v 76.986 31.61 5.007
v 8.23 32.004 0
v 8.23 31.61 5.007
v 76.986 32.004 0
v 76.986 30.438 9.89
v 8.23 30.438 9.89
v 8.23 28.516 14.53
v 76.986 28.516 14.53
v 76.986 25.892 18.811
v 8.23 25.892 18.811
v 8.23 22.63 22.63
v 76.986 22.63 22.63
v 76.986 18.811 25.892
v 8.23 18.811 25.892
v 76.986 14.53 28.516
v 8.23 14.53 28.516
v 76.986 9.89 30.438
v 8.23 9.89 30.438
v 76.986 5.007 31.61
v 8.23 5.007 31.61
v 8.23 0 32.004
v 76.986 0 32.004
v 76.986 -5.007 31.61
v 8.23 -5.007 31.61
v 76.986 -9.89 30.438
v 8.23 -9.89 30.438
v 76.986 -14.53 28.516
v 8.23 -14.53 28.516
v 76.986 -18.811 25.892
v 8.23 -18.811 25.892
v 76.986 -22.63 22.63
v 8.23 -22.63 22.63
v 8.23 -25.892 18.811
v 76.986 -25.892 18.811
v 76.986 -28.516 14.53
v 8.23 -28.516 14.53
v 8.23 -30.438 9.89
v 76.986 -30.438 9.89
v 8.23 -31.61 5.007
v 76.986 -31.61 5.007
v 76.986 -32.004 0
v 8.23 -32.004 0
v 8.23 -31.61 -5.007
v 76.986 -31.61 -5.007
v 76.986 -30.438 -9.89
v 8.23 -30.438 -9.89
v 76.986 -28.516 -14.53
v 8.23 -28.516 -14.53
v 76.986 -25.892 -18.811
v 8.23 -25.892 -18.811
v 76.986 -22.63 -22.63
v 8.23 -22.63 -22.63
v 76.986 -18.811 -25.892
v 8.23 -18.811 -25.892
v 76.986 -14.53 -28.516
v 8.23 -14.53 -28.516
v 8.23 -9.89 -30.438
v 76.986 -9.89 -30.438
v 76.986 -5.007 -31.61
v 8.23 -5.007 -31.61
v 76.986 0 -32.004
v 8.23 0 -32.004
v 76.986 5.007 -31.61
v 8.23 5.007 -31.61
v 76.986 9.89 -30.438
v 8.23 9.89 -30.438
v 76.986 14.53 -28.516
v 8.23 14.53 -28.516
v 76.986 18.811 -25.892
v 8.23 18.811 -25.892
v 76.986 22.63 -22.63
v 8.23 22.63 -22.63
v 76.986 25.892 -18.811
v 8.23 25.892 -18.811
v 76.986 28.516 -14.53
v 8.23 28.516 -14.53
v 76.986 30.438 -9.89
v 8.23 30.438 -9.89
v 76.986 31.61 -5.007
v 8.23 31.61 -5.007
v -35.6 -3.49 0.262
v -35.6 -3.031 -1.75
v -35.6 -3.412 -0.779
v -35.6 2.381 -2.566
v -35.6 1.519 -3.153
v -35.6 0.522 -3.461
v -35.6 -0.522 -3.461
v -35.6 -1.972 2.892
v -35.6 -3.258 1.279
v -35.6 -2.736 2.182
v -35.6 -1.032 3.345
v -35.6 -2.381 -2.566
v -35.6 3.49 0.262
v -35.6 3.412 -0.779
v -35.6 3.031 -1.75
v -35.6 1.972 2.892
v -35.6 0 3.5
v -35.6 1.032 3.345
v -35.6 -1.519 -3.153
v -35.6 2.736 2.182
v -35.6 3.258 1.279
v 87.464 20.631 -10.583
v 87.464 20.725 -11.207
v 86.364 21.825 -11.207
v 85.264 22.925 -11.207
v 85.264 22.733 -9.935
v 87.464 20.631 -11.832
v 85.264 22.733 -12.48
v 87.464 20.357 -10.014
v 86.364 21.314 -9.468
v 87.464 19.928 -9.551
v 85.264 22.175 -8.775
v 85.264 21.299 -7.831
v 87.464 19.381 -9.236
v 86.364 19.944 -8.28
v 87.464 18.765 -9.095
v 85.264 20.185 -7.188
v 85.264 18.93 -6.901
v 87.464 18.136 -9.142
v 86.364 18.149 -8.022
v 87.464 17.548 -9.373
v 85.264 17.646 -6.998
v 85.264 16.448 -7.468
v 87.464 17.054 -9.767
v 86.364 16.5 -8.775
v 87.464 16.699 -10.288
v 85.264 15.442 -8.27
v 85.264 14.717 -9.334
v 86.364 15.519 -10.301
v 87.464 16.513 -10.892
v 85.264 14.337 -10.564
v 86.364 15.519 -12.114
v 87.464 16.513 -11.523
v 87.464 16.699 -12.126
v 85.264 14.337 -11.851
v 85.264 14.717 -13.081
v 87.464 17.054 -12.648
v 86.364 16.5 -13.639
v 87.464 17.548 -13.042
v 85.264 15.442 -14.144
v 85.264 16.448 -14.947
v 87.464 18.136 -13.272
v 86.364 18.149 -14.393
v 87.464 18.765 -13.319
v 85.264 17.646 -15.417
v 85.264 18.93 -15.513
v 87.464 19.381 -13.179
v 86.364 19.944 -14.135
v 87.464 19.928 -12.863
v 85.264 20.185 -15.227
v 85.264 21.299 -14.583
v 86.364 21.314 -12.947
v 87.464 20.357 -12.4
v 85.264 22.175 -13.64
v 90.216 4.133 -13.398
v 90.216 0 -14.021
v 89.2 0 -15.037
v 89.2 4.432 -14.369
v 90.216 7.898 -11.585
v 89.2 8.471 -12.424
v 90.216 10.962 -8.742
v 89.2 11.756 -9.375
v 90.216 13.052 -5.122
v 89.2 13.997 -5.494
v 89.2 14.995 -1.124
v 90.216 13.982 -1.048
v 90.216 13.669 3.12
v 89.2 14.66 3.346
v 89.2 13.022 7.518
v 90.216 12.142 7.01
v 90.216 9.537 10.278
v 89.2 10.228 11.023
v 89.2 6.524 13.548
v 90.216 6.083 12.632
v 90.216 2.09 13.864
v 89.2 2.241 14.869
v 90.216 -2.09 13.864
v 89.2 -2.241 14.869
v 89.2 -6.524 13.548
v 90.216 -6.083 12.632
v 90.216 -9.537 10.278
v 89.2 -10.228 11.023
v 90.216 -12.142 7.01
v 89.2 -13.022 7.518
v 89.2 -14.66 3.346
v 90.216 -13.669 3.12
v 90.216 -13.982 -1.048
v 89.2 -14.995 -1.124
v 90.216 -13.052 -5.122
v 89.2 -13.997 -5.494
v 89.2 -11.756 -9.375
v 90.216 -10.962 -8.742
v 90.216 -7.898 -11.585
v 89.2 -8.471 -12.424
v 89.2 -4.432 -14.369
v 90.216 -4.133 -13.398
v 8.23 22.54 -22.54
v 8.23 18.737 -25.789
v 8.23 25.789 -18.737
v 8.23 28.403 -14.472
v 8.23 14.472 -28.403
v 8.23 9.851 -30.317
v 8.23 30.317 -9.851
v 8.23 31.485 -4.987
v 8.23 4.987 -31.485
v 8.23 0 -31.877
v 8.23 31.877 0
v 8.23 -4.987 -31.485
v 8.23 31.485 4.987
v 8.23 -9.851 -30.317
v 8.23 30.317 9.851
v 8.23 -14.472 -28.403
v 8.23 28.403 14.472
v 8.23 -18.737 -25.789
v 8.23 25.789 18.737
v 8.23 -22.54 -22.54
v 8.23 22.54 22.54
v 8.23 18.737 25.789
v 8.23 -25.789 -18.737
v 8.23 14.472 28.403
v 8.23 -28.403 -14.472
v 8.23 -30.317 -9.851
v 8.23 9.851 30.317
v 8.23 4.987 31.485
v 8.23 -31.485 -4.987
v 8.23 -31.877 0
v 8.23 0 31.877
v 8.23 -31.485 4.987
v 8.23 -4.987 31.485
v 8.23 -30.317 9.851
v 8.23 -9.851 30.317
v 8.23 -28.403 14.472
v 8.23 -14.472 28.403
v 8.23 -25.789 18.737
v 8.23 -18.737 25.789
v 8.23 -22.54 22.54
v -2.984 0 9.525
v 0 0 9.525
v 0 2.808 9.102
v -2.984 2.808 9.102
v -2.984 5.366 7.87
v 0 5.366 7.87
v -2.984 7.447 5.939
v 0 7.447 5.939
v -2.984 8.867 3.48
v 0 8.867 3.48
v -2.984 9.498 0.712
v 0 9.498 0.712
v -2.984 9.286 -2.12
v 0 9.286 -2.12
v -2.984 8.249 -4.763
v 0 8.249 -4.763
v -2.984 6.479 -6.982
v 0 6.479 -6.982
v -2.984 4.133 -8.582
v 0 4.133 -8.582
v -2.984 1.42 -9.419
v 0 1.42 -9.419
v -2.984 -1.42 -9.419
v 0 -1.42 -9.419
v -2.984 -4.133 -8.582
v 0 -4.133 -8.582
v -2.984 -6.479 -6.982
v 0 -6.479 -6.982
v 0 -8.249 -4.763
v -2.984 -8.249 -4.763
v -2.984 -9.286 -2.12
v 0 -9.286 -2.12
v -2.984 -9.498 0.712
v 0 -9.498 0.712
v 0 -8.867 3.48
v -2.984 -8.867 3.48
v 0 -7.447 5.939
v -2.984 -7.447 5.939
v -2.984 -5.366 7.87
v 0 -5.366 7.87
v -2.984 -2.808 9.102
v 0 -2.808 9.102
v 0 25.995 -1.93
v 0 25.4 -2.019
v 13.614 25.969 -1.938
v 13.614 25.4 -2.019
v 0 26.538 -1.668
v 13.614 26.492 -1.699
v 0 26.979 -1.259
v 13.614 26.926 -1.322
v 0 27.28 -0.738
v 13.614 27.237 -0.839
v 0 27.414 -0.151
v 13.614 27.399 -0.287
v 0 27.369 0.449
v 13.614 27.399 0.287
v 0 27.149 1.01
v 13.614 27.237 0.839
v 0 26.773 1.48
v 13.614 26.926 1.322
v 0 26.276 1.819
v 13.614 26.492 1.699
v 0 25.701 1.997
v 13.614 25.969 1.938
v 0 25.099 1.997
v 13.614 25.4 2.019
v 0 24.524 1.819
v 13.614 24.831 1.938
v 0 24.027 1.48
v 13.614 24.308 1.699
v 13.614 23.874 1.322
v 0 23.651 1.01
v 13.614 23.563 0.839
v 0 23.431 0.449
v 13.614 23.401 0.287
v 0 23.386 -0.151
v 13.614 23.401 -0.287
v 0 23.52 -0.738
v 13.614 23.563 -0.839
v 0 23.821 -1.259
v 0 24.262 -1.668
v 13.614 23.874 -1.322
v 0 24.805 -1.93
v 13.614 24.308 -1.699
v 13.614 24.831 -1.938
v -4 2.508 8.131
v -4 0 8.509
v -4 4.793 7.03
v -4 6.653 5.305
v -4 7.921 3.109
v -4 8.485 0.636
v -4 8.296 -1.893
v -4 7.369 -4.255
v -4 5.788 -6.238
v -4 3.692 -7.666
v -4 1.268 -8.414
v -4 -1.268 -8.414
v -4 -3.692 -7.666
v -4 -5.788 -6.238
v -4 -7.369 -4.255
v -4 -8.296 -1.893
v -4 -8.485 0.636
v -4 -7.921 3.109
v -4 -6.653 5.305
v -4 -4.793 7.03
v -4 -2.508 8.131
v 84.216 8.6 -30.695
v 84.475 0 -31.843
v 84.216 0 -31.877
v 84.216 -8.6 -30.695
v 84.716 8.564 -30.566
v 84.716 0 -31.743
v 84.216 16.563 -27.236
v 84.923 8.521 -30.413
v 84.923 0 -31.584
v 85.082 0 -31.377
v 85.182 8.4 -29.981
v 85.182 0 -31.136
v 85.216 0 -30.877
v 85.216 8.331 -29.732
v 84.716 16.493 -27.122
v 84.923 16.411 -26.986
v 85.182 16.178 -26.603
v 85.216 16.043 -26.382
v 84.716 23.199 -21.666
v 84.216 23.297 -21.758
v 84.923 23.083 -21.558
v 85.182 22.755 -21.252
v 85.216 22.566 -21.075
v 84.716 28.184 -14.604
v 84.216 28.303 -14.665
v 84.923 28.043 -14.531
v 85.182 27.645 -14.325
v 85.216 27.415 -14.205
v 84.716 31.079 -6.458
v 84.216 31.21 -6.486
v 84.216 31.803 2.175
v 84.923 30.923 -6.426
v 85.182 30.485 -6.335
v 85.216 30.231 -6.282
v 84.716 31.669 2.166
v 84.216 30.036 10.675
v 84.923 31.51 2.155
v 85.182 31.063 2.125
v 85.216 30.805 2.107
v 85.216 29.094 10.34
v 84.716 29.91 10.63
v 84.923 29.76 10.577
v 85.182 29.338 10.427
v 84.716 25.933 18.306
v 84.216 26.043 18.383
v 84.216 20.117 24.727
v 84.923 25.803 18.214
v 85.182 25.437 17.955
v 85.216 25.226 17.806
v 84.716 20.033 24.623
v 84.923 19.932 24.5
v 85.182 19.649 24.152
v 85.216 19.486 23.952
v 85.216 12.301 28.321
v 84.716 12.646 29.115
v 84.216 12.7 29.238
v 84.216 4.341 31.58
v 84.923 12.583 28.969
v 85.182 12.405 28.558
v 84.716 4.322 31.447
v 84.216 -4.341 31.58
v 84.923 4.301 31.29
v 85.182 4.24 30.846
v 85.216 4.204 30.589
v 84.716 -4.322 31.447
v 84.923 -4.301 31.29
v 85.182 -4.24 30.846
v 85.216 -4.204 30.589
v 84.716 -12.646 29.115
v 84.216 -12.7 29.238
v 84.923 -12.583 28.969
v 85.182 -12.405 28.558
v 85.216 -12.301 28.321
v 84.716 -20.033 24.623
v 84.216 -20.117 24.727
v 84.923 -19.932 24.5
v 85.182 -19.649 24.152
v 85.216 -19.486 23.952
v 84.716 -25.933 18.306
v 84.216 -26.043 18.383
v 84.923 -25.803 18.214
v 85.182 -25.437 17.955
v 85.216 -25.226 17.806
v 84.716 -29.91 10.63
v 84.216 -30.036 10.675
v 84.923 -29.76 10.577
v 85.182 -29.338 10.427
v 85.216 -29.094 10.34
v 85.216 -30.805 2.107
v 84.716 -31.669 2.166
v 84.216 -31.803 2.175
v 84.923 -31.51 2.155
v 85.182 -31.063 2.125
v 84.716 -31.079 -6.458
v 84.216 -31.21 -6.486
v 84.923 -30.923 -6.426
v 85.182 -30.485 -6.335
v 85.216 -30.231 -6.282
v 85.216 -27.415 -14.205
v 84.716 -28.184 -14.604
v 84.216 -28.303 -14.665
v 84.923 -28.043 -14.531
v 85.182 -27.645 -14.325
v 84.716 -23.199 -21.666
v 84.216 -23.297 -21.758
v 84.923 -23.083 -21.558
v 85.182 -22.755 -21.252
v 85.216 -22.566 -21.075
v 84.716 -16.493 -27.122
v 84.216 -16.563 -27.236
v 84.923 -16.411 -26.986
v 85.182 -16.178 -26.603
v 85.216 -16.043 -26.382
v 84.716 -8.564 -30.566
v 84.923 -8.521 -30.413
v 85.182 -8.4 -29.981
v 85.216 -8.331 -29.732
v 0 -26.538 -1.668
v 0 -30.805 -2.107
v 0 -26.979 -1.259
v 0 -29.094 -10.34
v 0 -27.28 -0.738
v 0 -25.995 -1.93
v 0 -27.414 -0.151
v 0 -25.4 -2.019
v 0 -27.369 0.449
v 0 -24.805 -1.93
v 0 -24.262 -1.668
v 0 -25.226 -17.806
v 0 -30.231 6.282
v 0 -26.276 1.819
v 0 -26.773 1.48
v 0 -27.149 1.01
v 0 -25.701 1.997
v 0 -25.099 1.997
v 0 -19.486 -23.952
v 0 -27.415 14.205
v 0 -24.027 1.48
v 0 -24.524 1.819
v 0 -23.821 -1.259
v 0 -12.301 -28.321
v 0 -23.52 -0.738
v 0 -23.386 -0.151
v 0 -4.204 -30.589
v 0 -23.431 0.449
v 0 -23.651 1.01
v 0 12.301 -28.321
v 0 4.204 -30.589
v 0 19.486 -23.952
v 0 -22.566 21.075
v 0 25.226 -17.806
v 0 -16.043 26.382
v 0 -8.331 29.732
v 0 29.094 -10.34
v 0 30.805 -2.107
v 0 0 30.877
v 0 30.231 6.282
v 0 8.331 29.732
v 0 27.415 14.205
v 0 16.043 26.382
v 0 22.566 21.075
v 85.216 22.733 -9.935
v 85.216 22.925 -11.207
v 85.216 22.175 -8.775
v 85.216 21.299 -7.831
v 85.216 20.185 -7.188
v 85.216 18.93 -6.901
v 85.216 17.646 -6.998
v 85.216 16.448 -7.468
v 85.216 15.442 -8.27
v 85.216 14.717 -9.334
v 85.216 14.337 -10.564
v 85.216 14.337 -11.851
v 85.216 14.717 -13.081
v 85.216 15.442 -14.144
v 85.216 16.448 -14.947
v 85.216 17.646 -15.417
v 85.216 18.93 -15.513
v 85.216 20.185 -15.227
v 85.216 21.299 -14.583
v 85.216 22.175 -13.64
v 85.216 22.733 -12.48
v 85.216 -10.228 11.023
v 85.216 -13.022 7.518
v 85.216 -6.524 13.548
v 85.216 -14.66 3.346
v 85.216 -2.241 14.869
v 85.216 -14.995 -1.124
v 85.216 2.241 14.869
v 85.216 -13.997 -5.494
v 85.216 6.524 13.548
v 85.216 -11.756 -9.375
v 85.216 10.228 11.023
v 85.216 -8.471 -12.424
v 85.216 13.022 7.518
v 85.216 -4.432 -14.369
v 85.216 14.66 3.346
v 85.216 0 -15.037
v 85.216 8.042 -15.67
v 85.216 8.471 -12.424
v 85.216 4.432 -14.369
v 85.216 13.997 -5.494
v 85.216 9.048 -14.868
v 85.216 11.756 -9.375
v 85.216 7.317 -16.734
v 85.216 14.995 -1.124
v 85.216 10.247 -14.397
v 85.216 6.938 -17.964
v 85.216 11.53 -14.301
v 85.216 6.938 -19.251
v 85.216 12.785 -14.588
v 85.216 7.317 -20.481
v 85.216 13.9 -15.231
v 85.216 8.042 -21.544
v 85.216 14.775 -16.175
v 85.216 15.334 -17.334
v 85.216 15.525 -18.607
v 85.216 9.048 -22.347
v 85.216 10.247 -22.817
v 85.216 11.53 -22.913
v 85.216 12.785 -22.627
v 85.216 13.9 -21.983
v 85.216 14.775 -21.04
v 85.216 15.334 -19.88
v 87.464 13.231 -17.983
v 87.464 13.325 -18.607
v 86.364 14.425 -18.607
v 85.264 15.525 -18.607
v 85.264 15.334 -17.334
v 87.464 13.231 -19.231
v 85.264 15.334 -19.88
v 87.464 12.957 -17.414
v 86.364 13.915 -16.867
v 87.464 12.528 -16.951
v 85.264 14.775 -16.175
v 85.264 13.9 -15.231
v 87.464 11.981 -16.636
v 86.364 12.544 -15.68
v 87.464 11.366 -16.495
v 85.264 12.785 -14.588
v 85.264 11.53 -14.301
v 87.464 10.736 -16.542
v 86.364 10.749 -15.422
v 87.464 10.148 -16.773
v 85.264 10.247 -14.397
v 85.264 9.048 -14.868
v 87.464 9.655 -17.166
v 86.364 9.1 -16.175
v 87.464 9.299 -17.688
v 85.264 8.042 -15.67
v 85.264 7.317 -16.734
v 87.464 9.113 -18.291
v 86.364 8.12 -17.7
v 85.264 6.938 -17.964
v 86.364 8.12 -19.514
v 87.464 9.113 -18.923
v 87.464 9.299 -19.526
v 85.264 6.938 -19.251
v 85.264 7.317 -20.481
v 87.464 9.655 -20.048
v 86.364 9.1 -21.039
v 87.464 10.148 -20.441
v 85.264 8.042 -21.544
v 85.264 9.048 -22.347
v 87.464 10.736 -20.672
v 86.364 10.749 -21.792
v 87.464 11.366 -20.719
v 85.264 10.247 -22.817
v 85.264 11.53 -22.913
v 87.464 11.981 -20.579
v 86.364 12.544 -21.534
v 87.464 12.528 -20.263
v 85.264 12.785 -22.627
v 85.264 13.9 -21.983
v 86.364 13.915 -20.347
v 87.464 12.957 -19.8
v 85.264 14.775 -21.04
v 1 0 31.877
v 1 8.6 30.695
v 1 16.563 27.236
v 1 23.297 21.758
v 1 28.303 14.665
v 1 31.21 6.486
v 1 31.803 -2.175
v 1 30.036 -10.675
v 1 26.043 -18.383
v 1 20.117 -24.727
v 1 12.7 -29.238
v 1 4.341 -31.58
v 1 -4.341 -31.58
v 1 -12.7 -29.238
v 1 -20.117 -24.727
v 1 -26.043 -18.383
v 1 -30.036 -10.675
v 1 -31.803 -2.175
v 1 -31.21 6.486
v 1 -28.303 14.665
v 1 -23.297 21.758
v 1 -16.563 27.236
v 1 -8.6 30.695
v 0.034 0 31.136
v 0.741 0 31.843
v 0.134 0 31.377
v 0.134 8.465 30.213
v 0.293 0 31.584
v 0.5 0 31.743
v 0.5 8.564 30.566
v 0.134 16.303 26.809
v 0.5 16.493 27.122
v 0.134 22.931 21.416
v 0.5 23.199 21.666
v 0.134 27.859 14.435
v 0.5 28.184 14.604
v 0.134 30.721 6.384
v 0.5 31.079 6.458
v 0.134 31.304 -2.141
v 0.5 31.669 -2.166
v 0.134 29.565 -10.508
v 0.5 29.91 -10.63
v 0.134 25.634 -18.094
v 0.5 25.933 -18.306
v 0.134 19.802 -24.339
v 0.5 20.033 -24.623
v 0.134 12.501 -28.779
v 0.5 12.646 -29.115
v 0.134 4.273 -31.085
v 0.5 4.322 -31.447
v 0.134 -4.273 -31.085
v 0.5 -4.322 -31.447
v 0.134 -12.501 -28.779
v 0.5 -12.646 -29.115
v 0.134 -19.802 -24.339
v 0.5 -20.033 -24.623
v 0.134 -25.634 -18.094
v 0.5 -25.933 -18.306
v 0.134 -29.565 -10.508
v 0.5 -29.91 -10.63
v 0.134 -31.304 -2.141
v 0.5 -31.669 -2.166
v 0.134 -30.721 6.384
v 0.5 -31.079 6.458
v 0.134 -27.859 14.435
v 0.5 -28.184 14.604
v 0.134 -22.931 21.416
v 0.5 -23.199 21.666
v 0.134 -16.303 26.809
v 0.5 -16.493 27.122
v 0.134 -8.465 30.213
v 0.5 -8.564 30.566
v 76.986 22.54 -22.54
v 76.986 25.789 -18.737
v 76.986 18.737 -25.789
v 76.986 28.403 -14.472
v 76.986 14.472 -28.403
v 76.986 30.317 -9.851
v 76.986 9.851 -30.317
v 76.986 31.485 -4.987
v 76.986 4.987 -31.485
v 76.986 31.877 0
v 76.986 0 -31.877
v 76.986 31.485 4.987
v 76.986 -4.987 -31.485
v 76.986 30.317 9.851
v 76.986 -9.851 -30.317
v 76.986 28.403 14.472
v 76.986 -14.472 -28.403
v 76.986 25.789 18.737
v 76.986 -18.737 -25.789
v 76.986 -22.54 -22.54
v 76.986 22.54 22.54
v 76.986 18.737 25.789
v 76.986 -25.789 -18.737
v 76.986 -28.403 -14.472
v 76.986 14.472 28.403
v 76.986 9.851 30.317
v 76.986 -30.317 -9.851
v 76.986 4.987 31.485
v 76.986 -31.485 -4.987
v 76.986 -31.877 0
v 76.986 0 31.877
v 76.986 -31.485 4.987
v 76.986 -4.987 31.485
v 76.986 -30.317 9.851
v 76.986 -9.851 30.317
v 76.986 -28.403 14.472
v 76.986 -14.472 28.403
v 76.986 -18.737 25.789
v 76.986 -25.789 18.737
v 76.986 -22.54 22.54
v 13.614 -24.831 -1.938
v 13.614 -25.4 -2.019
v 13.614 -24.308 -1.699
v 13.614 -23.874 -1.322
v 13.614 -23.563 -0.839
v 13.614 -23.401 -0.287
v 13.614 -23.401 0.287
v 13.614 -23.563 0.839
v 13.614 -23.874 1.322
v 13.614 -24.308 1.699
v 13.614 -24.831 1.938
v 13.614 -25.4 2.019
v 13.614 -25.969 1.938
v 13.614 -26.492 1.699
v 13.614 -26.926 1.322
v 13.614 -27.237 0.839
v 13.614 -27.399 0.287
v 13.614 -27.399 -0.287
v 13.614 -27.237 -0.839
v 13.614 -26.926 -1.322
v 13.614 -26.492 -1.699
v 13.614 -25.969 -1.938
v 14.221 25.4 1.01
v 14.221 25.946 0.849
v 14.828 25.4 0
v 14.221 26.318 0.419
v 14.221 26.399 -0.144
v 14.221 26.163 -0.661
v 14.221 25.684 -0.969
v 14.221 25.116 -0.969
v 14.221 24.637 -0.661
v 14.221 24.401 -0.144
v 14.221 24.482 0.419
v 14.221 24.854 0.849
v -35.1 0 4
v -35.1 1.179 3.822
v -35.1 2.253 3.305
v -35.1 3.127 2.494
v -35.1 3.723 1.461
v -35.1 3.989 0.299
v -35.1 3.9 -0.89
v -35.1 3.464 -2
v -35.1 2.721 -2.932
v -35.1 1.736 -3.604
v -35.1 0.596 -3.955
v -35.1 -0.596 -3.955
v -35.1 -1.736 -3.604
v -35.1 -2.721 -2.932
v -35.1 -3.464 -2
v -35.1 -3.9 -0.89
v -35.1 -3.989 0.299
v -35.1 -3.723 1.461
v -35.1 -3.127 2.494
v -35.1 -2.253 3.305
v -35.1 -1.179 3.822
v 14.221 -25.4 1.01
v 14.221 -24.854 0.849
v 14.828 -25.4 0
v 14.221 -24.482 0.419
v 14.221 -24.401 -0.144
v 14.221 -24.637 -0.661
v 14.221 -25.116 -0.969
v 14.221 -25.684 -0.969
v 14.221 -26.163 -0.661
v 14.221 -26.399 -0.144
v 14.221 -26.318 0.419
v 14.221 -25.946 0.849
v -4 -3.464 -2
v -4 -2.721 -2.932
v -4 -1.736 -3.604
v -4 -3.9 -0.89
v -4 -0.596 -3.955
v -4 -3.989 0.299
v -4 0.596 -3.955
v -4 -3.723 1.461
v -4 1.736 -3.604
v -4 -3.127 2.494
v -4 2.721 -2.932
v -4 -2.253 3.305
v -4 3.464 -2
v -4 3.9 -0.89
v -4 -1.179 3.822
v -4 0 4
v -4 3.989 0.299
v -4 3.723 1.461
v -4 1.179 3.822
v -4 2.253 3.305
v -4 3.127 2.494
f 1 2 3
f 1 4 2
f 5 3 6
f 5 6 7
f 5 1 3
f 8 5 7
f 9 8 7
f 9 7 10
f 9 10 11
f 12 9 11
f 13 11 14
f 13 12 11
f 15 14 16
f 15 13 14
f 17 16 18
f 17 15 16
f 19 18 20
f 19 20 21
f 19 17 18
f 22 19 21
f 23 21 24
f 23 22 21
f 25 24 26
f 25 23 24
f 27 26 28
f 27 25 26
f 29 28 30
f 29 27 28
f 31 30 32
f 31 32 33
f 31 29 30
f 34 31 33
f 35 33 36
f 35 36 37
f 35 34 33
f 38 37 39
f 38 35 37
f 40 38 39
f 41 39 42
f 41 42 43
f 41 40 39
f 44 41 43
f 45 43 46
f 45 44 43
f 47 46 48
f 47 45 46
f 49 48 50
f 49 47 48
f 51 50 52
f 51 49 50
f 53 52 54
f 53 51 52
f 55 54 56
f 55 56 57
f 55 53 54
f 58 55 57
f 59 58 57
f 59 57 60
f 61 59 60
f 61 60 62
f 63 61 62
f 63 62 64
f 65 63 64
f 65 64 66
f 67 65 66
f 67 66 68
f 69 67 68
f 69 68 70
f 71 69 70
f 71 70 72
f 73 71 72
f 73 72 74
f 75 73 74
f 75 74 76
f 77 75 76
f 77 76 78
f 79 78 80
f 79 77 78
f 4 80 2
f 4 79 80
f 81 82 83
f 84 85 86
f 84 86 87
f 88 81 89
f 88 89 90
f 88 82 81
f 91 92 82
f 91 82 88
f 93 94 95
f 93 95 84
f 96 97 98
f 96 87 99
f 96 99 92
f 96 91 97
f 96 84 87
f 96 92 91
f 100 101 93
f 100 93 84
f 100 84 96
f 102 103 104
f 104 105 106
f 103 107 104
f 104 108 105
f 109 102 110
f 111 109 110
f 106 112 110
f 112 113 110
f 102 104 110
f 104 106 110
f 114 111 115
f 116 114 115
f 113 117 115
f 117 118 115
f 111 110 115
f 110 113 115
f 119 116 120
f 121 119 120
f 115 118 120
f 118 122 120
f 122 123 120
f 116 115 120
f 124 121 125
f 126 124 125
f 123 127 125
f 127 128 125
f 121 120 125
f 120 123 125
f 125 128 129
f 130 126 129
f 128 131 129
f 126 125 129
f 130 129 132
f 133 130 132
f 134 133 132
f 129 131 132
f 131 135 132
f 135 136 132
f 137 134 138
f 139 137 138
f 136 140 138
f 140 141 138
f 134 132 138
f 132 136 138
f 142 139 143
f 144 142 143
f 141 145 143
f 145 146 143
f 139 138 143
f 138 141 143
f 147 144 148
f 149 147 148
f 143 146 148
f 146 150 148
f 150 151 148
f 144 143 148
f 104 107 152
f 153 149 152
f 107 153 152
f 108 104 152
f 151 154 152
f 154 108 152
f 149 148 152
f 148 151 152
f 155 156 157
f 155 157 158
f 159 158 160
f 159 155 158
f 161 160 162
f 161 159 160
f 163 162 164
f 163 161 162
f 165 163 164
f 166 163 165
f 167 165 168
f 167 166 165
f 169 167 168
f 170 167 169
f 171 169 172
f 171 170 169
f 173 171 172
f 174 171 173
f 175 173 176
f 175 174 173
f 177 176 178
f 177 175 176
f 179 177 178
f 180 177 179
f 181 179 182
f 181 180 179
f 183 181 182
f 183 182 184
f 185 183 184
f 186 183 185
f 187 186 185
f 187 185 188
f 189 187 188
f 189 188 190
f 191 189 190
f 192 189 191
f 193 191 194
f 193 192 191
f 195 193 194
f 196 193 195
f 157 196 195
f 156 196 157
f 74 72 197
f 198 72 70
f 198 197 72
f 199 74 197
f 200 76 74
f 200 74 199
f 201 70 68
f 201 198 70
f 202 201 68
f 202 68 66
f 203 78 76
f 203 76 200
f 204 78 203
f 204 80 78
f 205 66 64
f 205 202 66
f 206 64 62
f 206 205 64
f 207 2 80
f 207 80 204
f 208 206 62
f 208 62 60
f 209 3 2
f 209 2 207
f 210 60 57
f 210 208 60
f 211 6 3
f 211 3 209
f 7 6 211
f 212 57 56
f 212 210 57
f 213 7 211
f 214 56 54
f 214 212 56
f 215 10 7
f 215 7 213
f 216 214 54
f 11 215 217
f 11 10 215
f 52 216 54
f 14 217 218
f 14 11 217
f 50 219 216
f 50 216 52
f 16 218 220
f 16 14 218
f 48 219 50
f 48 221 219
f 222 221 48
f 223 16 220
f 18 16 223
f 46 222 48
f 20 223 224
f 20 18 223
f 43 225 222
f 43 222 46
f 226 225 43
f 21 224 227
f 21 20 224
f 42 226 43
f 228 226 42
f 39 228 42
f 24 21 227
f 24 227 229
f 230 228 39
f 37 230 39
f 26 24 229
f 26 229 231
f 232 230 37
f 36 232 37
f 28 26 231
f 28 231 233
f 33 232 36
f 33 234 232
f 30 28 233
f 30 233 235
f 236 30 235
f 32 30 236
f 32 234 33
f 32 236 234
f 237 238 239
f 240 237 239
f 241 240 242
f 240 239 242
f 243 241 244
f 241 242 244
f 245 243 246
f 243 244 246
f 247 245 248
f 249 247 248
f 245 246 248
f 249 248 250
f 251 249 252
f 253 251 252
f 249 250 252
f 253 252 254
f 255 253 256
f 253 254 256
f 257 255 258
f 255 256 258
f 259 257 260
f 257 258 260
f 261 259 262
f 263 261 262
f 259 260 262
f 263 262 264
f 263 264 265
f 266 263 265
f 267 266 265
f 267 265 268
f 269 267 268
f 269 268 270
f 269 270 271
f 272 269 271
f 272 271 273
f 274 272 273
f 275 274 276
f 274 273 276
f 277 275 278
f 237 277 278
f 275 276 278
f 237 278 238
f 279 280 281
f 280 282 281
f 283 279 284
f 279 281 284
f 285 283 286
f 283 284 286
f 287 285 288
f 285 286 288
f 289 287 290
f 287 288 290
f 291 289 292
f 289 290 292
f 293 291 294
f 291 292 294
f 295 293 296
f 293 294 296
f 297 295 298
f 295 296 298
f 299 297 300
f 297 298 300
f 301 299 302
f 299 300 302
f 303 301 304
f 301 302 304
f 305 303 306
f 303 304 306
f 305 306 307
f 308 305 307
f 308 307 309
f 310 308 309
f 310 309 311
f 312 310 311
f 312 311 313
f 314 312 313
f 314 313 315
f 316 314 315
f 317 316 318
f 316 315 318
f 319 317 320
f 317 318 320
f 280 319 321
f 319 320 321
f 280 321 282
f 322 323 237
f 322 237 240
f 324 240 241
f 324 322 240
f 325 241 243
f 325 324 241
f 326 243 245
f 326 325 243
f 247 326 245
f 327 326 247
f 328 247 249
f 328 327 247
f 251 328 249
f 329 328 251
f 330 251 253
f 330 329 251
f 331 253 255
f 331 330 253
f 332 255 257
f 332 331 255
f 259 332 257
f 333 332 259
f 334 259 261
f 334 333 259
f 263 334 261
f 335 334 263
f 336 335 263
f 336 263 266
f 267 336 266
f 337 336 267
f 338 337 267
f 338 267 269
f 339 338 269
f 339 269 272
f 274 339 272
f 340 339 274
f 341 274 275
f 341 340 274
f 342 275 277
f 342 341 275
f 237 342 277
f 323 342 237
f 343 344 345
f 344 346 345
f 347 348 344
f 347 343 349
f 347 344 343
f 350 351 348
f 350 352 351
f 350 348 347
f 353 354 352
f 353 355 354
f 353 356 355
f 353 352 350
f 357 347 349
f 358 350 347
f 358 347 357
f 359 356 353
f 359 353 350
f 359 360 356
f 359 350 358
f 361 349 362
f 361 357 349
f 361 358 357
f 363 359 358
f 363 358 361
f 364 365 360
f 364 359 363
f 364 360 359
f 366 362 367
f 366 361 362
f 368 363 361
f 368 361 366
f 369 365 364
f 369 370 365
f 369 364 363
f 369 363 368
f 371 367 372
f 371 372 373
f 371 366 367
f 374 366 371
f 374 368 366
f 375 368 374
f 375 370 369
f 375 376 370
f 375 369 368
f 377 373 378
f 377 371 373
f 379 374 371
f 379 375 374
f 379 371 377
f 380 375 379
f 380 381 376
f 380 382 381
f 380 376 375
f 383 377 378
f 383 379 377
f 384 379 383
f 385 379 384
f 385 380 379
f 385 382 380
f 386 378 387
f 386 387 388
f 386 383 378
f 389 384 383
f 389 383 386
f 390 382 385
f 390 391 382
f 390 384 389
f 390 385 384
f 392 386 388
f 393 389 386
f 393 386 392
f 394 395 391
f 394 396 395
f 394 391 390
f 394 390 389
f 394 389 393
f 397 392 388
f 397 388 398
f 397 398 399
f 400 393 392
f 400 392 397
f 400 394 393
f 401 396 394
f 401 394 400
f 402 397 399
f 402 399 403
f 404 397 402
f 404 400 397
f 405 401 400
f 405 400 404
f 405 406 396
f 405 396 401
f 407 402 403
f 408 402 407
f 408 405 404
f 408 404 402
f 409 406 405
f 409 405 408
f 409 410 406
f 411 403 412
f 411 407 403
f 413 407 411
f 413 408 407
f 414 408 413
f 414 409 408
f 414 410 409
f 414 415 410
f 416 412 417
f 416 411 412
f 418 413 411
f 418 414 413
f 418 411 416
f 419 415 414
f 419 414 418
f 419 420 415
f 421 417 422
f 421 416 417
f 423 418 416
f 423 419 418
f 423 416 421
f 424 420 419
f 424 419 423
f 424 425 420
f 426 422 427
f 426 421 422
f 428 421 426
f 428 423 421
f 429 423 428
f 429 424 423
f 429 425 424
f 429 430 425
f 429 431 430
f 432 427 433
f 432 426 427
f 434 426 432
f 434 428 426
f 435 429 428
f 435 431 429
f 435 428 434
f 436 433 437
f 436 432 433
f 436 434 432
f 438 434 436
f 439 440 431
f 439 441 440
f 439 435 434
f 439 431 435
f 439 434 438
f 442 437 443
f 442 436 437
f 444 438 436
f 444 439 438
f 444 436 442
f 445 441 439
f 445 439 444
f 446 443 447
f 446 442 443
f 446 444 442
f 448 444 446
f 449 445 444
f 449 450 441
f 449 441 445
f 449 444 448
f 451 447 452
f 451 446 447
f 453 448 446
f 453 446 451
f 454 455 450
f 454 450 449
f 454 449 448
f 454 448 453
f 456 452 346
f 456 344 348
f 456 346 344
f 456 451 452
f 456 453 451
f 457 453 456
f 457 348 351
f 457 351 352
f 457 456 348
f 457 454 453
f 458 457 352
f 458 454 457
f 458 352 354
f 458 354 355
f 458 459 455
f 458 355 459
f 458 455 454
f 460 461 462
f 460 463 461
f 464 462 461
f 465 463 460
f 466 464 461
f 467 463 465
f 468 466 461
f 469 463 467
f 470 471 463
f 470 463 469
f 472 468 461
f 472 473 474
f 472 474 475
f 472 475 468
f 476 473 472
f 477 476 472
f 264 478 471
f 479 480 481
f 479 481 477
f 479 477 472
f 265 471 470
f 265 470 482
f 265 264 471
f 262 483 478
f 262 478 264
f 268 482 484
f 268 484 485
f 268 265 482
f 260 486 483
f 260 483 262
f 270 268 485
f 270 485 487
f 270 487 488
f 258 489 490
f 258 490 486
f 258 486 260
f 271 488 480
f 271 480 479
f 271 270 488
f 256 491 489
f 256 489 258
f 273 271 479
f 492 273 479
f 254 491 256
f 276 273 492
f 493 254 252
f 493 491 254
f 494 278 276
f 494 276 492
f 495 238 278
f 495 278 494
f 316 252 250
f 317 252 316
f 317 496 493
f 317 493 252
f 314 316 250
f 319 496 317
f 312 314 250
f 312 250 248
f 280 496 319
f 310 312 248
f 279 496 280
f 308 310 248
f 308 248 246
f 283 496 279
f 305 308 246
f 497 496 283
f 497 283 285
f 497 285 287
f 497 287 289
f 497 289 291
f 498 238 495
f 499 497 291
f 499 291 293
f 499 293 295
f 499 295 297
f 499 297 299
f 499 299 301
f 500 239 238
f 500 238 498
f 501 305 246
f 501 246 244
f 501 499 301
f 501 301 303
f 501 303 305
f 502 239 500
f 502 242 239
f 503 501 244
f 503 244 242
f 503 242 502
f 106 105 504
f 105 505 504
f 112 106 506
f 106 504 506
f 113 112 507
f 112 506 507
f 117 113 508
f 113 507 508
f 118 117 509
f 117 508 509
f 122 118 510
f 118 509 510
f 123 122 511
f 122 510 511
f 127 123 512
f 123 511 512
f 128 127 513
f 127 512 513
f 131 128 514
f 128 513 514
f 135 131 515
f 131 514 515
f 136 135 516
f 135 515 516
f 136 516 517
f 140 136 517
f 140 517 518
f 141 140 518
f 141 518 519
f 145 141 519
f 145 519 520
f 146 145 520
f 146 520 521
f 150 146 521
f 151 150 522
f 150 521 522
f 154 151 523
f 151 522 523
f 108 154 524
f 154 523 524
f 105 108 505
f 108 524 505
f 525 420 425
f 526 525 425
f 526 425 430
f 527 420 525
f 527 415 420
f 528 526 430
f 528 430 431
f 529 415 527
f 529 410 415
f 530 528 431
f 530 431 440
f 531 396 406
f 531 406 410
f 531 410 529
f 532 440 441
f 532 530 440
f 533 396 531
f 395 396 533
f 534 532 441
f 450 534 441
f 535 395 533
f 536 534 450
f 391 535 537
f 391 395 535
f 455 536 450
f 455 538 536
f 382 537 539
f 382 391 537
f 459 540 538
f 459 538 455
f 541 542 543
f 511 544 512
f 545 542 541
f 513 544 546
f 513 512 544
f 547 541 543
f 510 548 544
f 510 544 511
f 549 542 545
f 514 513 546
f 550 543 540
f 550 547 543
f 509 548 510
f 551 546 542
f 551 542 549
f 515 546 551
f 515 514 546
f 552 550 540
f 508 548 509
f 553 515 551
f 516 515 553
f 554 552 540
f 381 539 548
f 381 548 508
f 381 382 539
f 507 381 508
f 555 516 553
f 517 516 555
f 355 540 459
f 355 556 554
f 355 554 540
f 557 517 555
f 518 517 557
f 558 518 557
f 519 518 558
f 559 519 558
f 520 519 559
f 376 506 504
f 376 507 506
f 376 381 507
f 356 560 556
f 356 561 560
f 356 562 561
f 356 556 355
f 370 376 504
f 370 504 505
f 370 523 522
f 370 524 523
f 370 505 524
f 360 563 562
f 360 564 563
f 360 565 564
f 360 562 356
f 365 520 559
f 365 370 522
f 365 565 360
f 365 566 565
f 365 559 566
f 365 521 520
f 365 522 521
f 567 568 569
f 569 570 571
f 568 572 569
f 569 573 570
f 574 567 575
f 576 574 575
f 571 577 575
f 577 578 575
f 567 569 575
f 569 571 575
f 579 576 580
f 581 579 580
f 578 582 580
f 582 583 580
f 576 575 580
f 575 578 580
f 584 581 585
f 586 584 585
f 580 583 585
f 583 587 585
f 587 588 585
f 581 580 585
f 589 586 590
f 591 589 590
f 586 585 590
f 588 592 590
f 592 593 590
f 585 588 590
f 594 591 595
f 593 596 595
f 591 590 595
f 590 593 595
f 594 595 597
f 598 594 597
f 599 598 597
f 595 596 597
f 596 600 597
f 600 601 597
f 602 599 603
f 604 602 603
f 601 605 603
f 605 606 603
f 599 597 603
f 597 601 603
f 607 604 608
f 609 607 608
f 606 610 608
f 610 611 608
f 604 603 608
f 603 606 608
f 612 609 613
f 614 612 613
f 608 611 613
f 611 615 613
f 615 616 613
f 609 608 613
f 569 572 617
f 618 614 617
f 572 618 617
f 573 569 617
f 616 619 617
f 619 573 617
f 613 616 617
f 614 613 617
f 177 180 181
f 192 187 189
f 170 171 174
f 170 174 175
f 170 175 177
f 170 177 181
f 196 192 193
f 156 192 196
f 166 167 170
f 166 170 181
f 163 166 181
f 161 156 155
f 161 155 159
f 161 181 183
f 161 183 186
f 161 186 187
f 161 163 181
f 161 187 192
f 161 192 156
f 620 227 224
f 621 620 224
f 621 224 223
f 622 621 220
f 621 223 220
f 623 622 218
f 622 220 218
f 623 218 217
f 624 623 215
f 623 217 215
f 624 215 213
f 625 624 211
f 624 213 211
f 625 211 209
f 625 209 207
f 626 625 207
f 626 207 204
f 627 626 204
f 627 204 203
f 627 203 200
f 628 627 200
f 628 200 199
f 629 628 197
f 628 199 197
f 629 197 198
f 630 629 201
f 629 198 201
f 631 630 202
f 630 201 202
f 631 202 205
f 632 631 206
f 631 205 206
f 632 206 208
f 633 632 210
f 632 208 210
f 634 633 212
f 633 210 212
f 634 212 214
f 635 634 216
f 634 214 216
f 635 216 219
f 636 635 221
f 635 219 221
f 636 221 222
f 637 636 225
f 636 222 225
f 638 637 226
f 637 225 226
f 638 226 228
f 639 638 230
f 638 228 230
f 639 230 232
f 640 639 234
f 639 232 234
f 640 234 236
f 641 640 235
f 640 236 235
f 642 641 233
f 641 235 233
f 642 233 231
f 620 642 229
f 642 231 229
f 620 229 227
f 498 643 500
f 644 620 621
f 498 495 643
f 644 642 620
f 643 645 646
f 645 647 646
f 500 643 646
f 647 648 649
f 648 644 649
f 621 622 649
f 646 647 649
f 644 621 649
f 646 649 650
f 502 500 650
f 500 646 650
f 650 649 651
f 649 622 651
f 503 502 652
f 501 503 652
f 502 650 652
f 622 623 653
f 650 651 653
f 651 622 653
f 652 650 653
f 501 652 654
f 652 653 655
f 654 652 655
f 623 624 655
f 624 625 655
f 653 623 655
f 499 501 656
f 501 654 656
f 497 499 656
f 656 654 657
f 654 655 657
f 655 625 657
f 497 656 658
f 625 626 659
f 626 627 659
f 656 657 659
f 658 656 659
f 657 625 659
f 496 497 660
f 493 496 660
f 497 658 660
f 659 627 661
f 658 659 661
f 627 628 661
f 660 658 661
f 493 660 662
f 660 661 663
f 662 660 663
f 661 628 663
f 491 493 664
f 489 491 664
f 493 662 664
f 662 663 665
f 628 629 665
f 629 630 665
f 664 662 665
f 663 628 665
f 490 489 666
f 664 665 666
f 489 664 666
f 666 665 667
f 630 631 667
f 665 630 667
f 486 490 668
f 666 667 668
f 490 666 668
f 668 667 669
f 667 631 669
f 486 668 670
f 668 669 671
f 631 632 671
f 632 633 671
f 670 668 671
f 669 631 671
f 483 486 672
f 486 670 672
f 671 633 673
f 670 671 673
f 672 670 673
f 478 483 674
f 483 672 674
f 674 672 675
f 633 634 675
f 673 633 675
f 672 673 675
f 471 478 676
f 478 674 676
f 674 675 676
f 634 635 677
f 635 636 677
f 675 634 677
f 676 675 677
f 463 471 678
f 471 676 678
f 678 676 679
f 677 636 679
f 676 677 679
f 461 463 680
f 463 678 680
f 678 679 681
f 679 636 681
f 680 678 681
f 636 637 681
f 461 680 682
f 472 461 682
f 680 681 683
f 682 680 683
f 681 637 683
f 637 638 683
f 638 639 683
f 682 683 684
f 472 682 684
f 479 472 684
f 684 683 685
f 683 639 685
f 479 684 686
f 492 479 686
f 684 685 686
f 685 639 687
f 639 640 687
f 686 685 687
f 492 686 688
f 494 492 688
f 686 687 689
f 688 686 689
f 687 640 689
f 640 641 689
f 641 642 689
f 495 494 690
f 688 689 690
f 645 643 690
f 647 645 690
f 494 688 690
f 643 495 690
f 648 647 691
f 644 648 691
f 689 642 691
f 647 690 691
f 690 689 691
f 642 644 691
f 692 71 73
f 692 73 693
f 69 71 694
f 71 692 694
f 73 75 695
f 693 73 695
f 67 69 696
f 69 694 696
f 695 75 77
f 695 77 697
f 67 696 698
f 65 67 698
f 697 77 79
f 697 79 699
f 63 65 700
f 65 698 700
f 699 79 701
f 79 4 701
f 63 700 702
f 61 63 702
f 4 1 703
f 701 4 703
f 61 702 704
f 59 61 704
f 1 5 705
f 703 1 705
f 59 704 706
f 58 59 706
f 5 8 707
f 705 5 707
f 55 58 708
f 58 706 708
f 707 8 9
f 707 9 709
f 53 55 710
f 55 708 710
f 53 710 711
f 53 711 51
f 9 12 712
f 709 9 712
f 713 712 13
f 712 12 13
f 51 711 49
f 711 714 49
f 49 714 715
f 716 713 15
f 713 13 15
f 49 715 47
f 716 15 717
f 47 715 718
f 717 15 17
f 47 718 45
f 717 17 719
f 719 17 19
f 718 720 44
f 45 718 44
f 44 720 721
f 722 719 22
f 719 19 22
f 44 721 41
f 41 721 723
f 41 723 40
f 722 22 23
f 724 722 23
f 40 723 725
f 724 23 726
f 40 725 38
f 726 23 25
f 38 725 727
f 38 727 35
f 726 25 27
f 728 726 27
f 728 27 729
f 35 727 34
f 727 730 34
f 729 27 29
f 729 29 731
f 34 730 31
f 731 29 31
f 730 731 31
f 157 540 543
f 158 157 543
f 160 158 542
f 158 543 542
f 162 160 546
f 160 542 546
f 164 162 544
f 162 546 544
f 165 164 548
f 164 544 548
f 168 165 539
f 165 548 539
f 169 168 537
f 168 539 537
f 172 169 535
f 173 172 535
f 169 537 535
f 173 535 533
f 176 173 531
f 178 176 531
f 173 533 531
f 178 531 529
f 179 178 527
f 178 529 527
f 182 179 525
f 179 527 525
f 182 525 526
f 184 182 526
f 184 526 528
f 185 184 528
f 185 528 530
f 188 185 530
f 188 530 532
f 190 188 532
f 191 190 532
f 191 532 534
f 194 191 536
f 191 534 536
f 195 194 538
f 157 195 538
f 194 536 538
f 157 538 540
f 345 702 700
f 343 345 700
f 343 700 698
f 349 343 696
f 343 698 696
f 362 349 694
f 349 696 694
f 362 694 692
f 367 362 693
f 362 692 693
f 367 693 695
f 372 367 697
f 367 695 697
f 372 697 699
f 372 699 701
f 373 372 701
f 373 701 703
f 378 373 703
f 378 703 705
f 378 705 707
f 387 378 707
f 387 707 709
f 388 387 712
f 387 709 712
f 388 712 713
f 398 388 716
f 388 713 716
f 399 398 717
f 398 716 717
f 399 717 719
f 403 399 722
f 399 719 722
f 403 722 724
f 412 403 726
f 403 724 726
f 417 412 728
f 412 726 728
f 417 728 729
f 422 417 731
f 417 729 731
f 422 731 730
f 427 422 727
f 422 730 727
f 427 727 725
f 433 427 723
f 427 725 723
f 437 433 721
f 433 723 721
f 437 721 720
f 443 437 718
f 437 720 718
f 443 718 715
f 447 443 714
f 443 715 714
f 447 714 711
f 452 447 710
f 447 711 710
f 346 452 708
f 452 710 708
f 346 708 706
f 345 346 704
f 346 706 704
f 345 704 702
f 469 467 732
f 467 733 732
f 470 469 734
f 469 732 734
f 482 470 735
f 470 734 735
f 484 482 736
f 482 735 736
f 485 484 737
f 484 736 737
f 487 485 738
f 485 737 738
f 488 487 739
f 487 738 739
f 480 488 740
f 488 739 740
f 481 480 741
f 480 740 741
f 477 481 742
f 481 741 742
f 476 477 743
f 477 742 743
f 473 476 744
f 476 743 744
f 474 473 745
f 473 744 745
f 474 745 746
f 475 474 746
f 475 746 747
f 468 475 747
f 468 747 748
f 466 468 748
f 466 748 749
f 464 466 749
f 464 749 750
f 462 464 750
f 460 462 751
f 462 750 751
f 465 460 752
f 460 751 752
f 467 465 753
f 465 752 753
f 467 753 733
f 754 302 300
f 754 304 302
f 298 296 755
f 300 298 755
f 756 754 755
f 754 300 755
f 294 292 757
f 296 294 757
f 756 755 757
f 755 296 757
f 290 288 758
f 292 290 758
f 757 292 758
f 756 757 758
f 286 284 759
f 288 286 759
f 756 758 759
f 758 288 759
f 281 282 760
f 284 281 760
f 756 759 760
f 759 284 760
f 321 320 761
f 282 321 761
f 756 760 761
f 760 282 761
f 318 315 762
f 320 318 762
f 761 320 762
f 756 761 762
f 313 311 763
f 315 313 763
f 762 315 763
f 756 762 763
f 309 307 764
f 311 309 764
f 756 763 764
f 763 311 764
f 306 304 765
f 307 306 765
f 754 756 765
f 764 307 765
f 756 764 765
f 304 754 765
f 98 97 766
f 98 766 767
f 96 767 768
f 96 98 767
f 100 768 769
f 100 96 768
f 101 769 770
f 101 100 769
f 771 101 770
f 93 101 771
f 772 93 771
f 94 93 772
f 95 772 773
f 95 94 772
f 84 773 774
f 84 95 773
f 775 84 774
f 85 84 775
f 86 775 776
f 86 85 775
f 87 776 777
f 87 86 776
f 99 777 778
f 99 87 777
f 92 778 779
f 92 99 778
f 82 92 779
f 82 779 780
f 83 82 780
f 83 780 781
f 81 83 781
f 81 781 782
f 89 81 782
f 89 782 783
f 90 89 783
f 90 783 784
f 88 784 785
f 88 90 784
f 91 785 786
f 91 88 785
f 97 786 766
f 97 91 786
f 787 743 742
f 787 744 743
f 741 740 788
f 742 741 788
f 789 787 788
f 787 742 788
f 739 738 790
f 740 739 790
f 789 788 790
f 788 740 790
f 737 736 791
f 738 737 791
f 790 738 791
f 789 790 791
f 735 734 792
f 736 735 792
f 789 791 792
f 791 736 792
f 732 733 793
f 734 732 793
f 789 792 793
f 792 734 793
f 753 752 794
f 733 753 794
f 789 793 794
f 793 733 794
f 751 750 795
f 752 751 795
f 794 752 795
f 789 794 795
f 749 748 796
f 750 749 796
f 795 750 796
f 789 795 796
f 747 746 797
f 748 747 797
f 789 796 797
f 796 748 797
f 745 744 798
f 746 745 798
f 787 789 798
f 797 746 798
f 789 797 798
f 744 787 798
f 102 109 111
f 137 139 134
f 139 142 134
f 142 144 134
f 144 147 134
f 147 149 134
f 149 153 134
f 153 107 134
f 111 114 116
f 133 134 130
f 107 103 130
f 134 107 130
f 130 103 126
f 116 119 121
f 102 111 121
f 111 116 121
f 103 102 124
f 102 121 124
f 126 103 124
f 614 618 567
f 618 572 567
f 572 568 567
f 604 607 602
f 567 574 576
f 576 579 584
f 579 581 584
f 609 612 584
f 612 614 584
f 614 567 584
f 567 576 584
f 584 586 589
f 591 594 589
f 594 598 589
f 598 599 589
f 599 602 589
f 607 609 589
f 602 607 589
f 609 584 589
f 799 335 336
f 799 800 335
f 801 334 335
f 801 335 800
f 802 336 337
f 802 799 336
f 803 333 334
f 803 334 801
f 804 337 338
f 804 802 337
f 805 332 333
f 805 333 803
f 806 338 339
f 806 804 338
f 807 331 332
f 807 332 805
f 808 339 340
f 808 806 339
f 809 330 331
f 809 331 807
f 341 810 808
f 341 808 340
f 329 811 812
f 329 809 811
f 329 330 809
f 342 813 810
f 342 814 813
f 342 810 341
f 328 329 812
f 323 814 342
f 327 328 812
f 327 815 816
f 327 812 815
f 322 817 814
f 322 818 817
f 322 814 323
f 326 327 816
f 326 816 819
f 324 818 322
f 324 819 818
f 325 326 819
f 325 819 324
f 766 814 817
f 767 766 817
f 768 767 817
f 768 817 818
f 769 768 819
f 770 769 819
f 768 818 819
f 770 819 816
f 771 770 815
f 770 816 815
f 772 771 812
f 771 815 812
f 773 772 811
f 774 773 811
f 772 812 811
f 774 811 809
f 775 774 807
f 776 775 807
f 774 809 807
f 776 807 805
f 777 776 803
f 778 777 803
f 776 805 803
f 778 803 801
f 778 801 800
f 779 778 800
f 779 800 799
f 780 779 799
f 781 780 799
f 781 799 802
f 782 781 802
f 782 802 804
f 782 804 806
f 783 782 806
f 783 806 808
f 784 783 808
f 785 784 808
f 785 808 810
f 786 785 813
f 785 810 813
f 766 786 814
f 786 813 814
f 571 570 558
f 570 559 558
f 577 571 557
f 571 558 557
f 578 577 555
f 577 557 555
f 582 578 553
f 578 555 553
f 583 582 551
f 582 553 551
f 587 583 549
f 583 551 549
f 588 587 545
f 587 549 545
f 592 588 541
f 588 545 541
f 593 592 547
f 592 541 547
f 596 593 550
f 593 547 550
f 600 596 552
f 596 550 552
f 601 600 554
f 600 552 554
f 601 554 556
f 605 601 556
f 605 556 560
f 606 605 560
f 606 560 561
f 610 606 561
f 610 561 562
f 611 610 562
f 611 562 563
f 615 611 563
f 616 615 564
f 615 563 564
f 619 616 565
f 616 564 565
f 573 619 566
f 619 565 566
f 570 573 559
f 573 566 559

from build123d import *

# Parameters (mm, degrees)
SKETCH1_W                       = 68.7568
SKETCH1_H                       = 32.004
SKETCH2_R                       = 31.877
BOSS_EXTRUDE1_DEPTH             = 8.2296
SKETCH3_R                       = 15.0368
BOSS_EXTRUDE2_DEPTH             = 5
SKETCH4_R                       = 31.877
BOSS_EXTRUDE3_DEPTH             = 8.2296
SKETCH5_R                       = 9.525
BOSS_EXTRUDE4_DEPTH             = 4
SKETCH6_R                       = 4
BOSS_EXTRUDE5_DEPTH             = 31.6
F_21_0_159_DIAMETER_HOLE1_D     = 4.0386
F_21_0_159_DIAMETER_HOLE1_DEPTH = 13.6144
F_21_0_159_DIAMETER_HOLE1_TIP   = 1.213317848
CHAMFER1_SIZE                   = 1.016
CHAMFER2_SIZE                   = 0.5
FILLET1_R                       = 1


with BuildPart() as part:
    # Sketch1 → Revolve1 (revolve)
    with BuildSketch(Plane.XY):
        with Locations((42.608, 16.002)):
            Rectangle(SKETCH1_W, SKETCH1_H)
    revolve(axis=Axis((8.2296, 0, 0), (1, 0, 0)))

    # Sketch2 → Boss-Extrude1 (add)
    with BuildSketch(Plane(origin=(76.9864, 0, 0), x_dir=(0, 0, -1), z_dir=(1, 0, 0))):
        Circle(SKETCH2_R)
    extrude(amount=BOSS_EXTRUDE1_DEPTH)

    # Sketch3 → Boss-Extrude2 (add)
    with BuildSketch(Plane(origin=(85.216, 0, 0), x_dir=(0, 0, -1), z_dir=(1, 0, 0))):
        Circle(SKETCH3_R)
    extrude(amount=BOSS_EXTRUDE2_DEPTH)

    # Sketch4 → Boss-Extrude3 (add)
    with BuildSketch(Plane.ZY.offset(-8.2296)):
        Circle(SKETCH4_R)
    extrude(amount=BOSS_EXTRUDE3_DEPTH)

    # Sketch5 → Boss-Extrude4 (add)
    with BuildSketch(Plane.ZY):
        Circle(SKETCH5_R)
    extrude(amount=BOSS_EXTRUDE4_DEPTH)

    # Sketch6 → Boss-Extrude5 (add)
    with BuildSketch(Plane.ZY.offset(4)):
        Circle(SKETCH6_R)
    extrude(amount=BOSS_EXTRUDE5_DEPTH)

    # Sketch8 → Revolve2 (revolve)
    with BuildSketch(Plane.XY.offset(-18.607090683)):
        Polygon((85.216, 15.525359639), (85.216, 11.207359639), (87.4639, 11.207359639), (87.4639, 13.325359639), (85.2639, 15.525359639), align=None)
    revolve(axis=Axis((85.216, 11.207359639, -18.607090683), (1, 0, 0)))

    # Sketch9 → Revolve3 (revolve)
    with BuildSketch(Plane.XY.offset(-11.207359639)):
        Polygon((85.216, 22.925090683), (85.216, 18.607090683), (87.4639, 18.607090683), (87.4639, 20.725090683), (85.2639, 22.925090683), align=None)
    revolve(axis=Axis((85.216, 18.607090683, -11.207359639), (1, 0, 0)))

    # #21 (0.159) Diameter Hole1
    with Locations(Plane.ZY):
        with Locations((0, 25.4), (0, -25.4)):
            Hole(F_21_0_159_DIAMETER_HOLE1_D / 2, depth=F_21_0_159_DIAMETER_HOLE1_DEPTH)
            with Locations((0, 0, -(F_21_0_159_DIAMETER_HOLE1_DEPTH + F_21_0_159_DIAMETER_HOLE1_TIP / 2))):  # 118° drill point
                Cone(0, F_21_0_159_DIAMETER_HOLE1_D / 2, F_21_0_159_DIAMETER_HOLE1_TIP, mode=Mode.SUBTRACT)

    # Chamfer1
    chamfer1_edges = [part.edges().sort_by_distance(p)[0] for p in [
        (90.216, 0, 15.0368),
        (-4, 0, -9.525),
    ]]
    chamfer(chamfer1_edges, length=CHAMFER1_SIZE)

    # Chamfer2
    chamfer2_edges = [part.edges().sort_by_distance(p)[0] for p in [
        (-35.6, 0, -4),
    ]]
    chamfer(chamfer2_edges, length=CHAMFER2_SIZE)

    # Fillet1
    fillet1_edges = [part.edges().sort_by_distance(p)[0] for p in [
        (0, 0, -31.877),
        (85.216, 0, 31.877),
    ]]
    fillet(fillet1_edges, radius=FILLET1_R)


solid = part.part
